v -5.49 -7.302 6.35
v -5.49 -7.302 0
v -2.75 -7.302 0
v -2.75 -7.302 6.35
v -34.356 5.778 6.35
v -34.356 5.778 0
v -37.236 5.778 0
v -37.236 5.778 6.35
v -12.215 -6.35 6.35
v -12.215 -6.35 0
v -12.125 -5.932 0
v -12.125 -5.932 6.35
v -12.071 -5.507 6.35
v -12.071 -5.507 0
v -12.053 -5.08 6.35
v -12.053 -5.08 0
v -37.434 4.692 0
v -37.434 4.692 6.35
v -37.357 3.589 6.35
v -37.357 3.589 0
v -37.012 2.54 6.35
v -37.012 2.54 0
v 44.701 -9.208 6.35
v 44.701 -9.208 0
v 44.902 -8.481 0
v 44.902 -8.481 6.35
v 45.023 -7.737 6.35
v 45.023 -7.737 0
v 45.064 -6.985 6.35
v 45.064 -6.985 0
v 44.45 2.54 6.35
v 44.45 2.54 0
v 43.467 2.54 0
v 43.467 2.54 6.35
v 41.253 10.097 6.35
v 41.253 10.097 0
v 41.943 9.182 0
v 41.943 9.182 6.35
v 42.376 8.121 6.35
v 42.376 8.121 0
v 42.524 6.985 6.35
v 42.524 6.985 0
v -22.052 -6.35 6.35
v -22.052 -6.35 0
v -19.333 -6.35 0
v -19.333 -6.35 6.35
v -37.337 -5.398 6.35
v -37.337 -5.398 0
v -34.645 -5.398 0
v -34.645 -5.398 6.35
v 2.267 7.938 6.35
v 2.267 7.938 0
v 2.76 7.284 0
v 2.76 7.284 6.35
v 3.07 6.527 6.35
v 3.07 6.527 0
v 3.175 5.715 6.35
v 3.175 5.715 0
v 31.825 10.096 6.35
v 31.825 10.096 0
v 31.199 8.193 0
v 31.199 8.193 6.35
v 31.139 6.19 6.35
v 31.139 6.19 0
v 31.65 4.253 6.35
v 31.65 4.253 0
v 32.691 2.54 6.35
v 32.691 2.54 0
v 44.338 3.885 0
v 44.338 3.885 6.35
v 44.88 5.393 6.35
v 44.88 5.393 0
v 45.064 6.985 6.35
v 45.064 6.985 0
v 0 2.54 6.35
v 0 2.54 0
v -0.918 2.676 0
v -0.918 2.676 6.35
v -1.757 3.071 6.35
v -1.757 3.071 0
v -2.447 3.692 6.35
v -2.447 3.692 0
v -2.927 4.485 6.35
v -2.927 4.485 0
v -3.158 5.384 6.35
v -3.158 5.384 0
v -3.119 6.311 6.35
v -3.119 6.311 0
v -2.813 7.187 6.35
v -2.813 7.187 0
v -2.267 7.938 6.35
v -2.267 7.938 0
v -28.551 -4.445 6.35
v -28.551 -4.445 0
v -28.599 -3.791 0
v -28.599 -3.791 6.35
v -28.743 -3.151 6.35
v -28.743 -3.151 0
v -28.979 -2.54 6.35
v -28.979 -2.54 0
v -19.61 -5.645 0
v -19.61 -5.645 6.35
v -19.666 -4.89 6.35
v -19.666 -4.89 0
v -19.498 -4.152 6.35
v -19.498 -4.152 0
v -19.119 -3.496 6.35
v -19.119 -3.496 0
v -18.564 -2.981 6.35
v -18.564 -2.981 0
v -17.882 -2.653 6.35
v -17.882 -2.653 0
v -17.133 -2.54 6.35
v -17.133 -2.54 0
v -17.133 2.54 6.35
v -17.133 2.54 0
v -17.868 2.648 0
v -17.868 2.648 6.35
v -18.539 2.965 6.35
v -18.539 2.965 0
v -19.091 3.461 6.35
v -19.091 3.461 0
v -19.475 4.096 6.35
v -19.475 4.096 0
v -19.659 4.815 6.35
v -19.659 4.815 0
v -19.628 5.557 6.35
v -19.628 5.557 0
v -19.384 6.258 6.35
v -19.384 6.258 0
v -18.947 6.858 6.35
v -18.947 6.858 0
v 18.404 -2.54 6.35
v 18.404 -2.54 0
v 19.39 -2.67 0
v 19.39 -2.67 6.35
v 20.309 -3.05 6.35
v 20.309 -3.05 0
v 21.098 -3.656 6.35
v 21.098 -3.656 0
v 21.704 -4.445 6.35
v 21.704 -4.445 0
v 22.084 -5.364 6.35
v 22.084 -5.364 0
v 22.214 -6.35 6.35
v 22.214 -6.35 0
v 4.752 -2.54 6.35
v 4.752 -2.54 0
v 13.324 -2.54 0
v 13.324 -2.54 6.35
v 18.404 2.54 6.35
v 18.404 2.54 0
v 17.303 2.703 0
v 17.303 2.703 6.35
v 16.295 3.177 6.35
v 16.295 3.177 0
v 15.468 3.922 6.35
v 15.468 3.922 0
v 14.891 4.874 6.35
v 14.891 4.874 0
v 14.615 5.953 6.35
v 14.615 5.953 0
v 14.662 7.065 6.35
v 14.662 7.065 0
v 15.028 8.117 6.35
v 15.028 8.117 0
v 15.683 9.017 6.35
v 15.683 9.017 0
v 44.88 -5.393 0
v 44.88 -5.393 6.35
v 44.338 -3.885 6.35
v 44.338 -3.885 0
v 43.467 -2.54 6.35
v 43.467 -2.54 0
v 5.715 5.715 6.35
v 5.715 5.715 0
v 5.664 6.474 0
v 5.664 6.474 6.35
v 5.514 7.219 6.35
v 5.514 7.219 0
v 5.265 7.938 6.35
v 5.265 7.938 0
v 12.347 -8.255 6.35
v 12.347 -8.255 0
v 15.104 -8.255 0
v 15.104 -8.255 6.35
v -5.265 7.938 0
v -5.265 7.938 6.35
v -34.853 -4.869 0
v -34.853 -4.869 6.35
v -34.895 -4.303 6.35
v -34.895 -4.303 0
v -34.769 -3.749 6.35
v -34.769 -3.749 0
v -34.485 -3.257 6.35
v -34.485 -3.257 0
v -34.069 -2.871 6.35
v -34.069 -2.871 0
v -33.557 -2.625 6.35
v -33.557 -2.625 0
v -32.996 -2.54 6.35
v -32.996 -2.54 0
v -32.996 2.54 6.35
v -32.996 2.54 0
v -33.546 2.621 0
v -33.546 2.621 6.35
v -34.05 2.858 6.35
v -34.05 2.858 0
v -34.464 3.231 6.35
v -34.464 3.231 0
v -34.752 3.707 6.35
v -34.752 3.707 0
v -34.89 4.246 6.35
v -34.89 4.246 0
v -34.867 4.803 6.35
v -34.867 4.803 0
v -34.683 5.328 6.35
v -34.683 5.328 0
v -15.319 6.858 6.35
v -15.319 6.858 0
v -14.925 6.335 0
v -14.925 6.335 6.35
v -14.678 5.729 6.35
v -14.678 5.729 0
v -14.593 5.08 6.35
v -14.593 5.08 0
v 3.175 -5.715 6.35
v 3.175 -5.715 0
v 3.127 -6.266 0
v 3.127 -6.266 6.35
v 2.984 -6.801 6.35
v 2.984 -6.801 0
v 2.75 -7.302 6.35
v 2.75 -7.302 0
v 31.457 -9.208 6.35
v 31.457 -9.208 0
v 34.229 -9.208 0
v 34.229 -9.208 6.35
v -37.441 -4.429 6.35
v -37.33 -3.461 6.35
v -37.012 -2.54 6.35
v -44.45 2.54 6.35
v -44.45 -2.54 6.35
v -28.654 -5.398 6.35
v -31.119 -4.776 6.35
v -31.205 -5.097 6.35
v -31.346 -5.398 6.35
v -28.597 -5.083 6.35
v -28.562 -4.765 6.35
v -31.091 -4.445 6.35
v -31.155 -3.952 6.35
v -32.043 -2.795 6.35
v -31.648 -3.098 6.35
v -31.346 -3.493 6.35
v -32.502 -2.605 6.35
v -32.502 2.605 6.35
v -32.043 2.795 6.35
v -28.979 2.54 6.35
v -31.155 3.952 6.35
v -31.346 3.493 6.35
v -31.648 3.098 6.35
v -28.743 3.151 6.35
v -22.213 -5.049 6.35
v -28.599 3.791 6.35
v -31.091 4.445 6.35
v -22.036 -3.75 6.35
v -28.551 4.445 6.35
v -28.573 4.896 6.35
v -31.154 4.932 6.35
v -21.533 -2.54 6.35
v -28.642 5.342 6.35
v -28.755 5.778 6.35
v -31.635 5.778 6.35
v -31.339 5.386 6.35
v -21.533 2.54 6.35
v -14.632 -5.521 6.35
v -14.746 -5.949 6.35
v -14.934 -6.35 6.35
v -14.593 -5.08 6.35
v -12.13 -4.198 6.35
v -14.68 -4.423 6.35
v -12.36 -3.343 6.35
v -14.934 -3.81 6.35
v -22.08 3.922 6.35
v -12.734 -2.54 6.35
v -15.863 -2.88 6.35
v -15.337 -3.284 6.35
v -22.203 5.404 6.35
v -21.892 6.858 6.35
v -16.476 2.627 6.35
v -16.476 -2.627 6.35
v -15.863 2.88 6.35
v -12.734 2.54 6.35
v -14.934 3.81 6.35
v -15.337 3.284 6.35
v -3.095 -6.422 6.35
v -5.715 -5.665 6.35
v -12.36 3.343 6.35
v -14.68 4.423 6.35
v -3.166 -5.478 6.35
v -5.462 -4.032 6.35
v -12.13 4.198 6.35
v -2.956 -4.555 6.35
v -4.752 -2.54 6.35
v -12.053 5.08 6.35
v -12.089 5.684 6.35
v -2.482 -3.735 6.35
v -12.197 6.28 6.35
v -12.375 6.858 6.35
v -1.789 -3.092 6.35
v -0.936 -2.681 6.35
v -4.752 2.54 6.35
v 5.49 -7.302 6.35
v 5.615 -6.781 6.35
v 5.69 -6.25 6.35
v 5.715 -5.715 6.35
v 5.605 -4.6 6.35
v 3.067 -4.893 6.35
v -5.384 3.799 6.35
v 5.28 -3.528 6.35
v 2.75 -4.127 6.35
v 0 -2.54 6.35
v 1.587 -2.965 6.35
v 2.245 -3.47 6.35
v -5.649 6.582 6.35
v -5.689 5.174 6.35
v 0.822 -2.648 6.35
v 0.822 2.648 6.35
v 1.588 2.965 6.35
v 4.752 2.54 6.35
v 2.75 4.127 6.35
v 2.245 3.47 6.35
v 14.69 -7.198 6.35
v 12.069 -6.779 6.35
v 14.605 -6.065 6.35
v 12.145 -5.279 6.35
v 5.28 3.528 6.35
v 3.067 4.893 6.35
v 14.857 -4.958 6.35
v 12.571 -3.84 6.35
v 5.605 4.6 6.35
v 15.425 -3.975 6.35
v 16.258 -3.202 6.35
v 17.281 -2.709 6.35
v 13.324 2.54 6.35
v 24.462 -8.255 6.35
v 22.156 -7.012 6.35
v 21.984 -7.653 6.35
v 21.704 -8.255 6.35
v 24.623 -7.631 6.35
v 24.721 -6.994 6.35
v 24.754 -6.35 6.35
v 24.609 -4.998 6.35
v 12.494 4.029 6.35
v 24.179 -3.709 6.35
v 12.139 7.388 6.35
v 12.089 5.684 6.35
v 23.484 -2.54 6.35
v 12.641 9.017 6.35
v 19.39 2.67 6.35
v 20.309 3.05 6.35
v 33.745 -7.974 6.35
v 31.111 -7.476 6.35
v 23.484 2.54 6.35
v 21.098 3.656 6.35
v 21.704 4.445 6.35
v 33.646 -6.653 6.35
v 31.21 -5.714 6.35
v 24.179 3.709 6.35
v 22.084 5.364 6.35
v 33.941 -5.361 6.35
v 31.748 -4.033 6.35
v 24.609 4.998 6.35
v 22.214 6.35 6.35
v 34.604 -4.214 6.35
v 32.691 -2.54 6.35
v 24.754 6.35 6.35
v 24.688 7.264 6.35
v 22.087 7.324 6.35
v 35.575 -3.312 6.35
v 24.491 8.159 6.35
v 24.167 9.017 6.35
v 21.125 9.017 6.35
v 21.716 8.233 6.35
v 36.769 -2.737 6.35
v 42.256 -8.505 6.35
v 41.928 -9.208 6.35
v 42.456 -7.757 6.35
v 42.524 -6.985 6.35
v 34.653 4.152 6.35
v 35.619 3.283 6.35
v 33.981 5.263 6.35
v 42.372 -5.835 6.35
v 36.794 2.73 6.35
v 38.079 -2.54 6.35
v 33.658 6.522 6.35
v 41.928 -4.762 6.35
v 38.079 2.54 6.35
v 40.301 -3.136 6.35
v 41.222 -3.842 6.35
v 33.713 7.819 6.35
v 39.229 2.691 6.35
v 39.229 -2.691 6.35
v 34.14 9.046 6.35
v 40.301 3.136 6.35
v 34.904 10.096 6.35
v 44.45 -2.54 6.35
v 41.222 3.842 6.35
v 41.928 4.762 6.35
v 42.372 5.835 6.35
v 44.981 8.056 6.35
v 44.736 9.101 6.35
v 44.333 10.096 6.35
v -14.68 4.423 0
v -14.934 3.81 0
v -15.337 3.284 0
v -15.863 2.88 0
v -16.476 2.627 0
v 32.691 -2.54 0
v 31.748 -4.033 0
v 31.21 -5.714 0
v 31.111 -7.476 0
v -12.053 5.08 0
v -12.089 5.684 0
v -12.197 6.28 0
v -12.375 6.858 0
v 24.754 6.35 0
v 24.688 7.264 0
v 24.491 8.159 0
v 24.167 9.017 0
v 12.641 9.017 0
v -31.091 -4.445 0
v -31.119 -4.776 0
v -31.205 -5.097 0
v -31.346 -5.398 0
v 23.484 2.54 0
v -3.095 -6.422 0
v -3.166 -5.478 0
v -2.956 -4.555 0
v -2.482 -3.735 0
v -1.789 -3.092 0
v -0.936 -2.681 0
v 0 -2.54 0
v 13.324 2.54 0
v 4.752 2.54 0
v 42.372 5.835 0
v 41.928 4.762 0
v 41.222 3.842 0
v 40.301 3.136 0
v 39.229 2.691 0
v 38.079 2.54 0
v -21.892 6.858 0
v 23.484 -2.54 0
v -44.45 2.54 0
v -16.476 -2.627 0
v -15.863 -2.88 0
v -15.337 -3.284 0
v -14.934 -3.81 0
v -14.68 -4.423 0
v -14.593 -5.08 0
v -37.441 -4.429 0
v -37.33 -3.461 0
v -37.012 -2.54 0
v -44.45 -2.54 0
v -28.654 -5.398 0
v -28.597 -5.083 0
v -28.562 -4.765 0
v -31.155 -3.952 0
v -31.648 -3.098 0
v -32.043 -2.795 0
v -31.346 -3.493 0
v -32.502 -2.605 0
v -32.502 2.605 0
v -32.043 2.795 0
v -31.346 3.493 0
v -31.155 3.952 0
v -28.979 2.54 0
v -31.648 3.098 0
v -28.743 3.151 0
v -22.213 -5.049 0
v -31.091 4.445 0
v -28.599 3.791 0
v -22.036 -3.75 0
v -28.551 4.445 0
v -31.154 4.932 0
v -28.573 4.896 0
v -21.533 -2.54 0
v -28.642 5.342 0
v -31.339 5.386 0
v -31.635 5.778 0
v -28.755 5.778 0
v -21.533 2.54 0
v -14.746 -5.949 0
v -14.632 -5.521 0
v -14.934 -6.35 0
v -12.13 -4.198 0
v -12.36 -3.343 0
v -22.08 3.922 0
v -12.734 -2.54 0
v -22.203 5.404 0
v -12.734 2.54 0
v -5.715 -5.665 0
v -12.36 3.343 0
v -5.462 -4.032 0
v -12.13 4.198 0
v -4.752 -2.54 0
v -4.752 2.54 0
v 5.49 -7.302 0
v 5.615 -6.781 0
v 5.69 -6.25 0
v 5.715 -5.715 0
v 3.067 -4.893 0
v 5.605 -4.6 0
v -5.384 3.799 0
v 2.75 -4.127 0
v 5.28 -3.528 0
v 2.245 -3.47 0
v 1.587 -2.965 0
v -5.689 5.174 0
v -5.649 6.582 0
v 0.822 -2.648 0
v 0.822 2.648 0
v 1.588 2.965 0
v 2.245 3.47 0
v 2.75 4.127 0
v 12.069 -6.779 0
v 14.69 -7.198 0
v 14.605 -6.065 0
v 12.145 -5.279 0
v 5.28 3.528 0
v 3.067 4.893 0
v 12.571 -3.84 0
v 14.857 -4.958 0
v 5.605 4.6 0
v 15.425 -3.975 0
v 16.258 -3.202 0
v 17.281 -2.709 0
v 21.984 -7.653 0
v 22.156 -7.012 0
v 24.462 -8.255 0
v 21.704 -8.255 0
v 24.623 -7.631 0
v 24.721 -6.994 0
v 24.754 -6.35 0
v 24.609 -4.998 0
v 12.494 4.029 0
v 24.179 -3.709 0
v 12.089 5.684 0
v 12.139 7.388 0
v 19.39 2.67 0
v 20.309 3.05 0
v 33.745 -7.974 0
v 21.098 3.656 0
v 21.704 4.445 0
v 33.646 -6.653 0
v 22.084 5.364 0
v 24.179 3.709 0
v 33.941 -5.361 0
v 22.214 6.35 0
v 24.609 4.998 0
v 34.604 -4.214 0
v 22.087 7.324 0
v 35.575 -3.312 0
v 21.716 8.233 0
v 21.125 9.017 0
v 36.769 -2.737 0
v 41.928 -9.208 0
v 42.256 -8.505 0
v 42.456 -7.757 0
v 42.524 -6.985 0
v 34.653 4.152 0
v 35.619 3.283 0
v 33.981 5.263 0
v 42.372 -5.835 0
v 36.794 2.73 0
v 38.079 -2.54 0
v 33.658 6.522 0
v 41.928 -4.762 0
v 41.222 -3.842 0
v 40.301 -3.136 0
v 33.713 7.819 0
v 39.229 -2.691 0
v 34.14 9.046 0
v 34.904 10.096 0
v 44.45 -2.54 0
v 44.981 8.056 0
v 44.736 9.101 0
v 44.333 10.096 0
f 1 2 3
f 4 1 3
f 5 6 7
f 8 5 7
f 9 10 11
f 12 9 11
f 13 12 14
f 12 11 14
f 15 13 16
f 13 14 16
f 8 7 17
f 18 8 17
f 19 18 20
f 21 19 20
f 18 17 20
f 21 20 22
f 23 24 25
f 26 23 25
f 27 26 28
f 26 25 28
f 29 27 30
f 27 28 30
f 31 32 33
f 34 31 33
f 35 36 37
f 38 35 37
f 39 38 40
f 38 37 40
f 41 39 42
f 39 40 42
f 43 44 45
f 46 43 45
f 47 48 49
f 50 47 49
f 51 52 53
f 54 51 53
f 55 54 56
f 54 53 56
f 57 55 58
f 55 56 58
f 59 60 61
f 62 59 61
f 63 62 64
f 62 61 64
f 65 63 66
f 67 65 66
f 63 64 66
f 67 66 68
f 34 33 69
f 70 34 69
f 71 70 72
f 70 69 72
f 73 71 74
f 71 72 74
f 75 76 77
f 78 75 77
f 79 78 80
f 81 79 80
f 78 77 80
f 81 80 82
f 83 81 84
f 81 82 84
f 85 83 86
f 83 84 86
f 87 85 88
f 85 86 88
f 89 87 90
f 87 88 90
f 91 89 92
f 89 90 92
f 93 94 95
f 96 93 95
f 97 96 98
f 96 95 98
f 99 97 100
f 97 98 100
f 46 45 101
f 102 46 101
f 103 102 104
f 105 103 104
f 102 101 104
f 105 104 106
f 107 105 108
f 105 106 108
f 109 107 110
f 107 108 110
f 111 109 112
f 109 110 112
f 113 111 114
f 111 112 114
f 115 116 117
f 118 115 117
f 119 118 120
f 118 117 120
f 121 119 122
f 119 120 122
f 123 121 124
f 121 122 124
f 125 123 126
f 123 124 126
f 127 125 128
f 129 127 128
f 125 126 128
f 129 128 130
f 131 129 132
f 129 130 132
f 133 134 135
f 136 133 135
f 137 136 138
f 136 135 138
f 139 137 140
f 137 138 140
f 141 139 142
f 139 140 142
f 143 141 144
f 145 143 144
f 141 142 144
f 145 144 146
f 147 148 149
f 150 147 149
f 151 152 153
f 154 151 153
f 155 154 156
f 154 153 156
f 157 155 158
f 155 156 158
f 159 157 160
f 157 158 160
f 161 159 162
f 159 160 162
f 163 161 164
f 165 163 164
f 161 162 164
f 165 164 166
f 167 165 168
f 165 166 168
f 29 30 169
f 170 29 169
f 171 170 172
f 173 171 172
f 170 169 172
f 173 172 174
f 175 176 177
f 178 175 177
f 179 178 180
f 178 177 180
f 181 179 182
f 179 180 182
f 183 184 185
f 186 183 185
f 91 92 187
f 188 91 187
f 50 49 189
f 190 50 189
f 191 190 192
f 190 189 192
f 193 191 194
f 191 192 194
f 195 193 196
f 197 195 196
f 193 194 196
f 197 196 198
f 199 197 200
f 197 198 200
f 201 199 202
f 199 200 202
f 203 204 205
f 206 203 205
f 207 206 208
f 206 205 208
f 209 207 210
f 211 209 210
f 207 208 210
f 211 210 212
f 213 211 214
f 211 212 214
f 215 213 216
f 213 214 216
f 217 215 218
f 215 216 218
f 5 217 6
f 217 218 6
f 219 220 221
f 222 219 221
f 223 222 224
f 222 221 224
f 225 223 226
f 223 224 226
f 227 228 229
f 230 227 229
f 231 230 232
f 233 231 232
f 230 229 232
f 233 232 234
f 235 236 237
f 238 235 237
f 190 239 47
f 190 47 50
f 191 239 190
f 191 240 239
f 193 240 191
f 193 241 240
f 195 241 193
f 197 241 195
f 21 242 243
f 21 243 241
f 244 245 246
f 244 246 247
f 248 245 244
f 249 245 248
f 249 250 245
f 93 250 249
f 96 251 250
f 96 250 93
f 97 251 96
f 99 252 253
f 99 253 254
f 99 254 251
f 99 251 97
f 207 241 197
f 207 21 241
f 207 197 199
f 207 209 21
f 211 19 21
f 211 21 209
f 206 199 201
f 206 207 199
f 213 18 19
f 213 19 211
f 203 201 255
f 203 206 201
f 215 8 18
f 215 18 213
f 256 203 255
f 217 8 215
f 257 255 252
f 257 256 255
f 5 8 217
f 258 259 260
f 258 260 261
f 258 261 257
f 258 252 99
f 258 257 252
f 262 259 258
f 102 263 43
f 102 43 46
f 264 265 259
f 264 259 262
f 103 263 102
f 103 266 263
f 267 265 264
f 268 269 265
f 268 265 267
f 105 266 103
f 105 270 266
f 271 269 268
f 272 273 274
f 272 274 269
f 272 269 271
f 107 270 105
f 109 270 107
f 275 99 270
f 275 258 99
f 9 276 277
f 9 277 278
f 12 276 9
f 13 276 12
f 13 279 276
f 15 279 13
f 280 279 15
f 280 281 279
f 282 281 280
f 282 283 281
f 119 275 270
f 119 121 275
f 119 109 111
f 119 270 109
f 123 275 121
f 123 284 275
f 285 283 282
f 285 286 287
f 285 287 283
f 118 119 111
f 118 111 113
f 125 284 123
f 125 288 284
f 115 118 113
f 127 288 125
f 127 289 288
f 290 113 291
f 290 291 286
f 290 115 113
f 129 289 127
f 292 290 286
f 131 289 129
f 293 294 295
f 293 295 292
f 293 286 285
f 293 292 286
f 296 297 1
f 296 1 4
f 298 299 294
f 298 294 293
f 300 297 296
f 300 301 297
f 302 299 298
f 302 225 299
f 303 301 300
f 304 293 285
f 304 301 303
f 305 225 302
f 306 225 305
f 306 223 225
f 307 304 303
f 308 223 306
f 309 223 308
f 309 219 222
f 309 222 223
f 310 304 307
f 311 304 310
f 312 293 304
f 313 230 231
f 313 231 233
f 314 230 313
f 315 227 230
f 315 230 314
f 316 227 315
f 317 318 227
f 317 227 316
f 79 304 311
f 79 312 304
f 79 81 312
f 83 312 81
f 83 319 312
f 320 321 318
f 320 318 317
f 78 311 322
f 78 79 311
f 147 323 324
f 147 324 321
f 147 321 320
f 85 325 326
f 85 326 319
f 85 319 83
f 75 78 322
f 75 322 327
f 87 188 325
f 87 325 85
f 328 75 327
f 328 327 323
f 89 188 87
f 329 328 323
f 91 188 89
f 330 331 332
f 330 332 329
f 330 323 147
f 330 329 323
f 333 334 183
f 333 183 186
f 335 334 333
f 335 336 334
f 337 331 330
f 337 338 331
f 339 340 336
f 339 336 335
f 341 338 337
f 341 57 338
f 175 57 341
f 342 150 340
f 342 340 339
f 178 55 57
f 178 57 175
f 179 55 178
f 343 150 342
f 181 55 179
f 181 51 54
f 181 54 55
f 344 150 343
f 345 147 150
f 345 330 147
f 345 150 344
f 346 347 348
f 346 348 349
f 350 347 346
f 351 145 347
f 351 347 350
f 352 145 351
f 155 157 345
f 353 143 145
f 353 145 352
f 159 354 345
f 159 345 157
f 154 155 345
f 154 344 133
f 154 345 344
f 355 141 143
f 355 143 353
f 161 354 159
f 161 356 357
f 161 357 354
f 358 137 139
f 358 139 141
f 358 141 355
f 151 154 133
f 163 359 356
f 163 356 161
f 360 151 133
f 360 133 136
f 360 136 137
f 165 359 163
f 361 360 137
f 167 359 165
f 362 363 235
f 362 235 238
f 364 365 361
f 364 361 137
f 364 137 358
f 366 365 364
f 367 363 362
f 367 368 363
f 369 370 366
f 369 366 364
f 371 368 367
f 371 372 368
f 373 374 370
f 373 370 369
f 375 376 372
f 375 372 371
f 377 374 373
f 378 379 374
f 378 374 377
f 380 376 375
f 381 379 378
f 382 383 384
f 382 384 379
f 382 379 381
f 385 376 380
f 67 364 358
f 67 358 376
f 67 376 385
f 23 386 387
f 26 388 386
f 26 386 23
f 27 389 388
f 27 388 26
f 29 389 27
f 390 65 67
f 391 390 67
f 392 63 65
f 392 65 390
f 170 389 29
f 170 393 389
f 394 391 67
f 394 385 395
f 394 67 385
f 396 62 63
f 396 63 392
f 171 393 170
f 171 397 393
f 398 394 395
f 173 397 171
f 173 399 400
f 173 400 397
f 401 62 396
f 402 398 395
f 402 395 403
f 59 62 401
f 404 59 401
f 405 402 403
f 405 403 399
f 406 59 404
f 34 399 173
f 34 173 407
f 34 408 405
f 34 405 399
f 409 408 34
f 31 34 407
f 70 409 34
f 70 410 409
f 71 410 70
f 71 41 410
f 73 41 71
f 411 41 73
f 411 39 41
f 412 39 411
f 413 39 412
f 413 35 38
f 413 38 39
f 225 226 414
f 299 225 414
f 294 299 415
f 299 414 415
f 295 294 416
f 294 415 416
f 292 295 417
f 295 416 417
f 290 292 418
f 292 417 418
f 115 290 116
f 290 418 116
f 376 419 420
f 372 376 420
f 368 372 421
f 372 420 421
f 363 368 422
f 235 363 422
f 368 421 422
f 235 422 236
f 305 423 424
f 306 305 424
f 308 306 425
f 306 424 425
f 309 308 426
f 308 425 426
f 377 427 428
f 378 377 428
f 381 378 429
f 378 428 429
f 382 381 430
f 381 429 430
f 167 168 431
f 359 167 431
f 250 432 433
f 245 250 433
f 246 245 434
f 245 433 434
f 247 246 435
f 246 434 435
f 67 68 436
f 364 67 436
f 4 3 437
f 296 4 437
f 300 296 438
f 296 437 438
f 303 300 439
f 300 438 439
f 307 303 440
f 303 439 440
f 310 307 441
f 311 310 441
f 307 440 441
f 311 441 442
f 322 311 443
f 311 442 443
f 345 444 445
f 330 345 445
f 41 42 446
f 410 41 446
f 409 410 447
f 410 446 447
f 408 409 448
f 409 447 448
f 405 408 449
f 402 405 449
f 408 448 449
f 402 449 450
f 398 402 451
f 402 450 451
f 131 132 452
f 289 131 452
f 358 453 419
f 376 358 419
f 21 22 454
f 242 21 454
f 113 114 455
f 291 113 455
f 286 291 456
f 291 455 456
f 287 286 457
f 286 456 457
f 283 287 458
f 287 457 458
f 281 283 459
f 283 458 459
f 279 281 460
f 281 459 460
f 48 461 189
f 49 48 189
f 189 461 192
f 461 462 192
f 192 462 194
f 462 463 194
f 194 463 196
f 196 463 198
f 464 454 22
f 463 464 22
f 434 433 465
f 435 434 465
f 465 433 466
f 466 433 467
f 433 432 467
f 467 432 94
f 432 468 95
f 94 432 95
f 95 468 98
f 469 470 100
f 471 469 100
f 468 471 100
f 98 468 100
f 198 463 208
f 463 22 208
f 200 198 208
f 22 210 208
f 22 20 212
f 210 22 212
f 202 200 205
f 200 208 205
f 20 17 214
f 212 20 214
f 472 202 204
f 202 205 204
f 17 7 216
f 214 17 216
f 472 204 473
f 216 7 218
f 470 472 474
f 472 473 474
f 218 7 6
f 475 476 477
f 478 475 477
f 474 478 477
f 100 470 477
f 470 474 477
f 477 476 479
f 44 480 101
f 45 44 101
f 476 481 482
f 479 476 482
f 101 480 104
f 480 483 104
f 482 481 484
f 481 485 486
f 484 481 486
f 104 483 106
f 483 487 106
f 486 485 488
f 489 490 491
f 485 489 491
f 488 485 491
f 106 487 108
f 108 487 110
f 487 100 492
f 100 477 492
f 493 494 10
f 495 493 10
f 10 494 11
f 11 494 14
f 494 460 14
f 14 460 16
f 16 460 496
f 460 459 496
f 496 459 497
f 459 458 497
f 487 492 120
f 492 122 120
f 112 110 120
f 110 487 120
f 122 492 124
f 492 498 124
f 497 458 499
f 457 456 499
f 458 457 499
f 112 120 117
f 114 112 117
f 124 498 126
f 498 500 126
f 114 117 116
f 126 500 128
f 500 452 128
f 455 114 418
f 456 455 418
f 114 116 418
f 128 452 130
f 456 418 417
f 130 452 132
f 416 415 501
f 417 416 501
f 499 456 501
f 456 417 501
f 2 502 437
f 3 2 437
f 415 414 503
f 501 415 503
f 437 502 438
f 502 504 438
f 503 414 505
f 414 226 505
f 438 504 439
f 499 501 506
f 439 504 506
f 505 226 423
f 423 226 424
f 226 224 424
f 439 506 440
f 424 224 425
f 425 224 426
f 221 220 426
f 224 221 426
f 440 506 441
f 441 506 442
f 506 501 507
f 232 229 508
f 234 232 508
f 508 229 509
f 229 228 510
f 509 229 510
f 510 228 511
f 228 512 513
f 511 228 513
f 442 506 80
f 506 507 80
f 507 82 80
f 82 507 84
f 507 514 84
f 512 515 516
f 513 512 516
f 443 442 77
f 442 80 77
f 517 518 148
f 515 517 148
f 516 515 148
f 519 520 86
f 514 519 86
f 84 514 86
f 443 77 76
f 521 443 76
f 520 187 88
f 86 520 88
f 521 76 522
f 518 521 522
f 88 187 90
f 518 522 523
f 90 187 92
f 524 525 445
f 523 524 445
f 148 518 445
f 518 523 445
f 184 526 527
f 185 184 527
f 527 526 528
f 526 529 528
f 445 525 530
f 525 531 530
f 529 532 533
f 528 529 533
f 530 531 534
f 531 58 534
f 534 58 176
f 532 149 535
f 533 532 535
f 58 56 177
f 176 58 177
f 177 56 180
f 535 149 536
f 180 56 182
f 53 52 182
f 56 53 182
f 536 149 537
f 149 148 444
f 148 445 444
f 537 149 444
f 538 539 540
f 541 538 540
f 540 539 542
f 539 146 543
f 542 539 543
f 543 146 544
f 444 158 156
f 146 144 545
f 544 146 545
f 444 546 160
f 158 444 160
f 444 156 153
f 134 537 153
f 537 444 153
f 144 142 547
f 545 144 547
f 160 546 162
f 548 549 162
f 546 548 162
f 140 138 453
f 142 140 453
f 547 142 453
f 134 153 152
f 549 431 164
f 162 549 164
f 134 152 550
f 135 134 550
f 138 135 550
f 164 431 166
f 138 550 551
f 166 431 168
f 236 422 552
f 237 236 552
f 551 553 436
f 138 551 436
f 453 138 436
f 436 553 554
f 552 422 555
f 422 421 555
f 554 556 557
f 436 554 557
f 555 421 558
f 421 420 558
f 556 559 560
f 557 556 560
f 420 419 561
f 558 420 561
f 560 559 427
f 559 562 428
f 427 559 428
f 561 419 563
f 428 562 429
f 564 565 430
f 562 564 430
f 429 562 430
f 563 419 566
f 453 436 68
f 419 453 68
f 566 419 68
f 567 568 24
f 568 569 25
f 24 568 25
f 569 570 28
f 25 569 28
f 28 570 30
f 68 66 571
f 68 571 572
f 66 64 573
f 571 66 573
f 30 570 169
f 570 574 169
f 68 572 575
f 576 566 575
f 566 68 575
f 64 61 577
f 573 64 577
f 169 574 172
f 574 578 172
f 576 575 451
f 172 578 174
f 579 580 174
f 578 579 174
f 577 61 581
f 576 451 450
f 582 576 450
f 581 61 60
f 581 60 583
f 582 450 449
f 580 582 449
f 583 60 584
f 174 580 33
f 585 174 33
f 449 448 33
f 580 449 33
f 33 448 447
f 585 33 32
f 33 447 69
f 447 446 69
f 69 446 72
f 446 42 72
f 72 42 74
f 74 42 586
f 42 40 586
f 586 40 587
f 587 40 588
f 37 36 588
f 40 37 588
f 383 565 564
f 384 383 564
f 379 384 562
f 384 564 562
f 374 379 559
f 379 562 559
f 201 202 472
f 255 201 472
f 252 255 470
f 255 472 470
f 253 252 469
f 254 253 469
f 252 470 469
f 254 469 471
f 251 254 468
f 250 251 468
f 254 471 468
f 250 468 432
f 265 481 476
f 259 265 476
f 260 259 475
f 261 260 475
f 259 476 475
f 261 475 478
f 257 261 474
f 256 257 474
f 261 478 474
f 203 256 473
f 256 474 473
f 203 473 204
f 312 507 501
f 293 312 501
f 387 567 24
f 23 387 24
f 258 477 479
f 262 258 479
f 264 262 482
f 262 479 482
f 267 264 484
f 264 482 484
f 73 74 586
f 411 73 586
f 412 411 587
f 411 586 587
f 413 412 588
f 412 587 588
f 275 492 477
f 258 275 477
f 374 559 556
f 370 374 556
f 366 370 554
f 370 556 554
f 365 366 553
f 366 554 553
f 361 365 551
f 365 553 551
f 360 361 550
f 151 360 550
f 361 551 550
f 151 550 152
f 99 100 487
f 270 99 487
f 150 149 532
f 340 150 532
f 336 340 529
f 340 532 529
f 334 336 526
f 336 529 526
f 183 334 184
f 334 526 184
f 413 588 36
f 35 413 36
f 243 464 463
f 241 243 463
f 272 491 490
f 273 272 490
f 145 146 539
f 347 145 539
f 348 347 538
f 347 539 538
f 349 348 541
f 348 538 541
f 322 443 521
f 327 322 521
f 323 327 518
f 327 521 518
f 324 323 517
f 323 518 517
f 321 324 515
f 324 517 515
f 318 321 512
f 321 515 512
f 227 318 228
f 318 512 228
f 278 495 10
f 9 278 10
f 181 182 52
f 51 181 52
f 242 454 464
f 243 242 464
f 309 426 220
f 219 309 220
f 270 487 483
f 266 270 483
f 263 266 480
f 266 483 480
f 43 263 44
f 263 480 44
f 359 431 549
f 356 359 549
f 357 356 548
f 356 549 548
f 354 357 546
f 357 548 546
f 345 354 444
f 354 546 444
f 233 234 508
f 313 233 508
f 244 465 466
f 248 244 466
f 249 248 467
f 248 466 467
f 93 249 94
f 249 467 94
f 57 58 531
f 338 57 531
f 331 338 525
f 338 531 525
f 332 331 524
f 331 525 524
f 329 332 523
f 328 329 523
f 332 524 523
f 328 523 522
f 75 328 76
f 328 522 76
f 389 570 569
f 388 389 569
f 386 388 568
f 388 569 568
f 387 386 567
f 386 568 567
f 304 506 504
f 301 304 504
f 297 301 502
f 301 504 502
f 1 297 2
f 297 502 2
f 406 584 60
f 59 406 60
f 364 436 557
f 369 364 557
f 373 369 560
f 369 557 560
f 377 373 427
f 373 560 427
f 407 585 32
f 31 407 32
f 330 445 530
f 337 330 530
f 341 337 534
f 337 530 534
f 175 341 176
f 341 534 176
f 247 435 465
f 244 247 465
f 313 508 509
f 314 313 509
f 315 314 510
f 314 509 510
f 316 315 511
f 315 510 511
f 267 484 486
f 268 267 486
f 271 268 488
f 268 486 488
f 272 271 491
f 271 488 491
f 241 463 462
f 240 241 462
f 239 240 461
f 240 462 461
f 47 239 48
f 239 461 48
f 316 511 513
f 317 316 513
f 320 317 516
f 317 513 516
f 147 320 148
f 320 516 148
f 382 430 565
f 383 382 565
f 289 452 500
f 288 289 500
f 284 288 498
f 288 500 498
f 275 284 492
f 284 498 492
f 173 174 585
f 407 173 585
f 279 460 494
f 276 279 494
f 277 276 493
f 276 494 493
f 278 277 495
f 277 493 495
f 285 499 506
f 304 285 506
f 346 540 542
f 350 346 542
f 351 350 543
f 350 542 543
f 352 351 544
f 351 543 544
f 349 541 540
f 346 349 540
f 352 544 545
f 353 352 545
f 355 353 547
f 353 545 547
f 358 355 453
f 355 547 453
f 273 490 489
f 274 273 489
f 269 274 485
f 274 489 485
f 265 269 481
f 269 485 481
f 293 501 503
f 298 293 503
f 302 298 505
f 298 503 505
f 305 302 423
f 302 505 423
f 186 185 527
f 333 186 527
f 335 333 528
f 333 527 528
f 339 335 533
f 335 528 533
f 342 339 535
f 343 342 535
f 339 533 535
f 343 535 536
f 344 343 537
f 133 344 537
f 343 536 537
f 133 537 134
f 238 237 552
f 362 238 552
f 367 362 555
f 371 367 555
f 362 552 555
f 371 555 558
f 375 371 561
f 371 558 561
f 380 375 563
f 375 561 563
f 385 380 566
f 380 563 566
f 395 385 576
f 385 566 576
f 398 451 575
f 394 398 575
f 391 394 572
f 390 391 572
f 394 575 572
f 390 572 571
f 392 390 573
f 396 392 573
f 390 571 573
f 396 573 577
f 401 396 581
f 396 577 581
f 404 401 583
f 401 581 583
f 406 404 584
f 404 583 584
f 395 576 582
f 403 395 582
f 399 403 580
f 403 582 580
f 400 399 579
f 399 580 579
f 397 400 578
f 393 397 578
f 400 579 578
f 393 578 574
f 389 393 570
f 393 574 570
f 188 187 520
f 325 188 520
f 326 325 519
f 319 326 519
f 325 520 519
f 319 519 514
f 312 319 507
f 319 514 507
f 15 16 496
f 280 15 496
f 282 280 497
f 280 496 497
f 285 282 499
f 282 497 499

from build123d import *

# Parameters (mm, degrees)
F1_DEPTH = 6.35


with BuildPart() as f1:
    # F0 (on Top) → F1 (new body)
    with BuildSketch(Plane.XY):
        with BuildLine():
            ThreePointArc((-37.0116242497, -2.54), (-35.3714840618, -0.6882893377), (-32.9955316212, 0))
            ThreePointArc((-32.9955316212, 0), (-35.3714840618, 0.6882893377), (-37.0116242497, 2.54))
            Line((-37.0116242497, 2.54), (-44.45, 2.54))
            Line((-44.45, 2.54), (-44.45, -2.54))
            Line((-44.45, -2.54), (-37.0116242497, -2.54))
        make_face()
        with BuildLine():
            Line((-32.9955316212, 2.54), (-28.9794389928, 2.54))
            ThreePointArc((-28.9794389928, 2.54), (-28.6590839545, 3.4686564983), (-28.5505316212, 4.445))
            ThreePointArc((-28.5505316212, 4.445), (-28.60201483, 5.1195629733), (-28.7552718709, 5.7785))
            Line((-28.7552718709, 5.7785), (-31.6350895056, 5.7785))
            ThreePointArc((-31.6350895056, 5.7785), (-31.231917827, 5.1652023222), (-31.0905316212, 4.445))
            ThreePointArc((-31.0905316212, 4.445), (-31.6484932031, 3.0979615818), (-32.9955316212, 2.54))
        make_face()
        with BuildLine():
            Line((-37.0116242497, 2.54), (-32.9955316212, 2.54))
            ThreePointArc((-32.9955316212, 2.54), (-34.7518548404, 3.7071966725), (-34.3559737369, 5.7785))
            Line((-34.3559737369, 5.7785), (-37.2357913715, 5.7785))
            ThreePointArc((-37.2357913715, 5.7785), (-37.4299210057, 4.1380540974), (-37.0116242497, 2.54))
        make_face()
        with BuildLine():
            ThreePointArc((-32.9955316212, 0), (-30.6195791806, 0.6882893377), (-28.9794389928, 2.54))
            Line((-28.9794389928, 2.54), (-32.9955316212, 2.54))
            Line((-32.9955316212, 2.54), (-37.0116242497, 2.54))
            ThreePointArc((-37.0116242497, 2.54), (-35.3714840618, 0.6882893377), (-32.9955316212, 0))
        make_face()
        with BuildLine():
            Line((-32.9955316212, -2.54), (-28.9794389928, -2.54))
            ThreePointArc((-28.9794389928, -2.54), (-30.6195791806, -0.6882893377), (-32.9955316212, 0))
            ThreePointArc((-32.9955316212, 0), (-35.3714840618, -0.6882893377), (-37.0116242497, -2.54))
            Line((-37.0116242497, -2.54), (-32.9955316212, -2.54))
        make_face()
        with BuildLine():
            ThreePointArc((-34.6453100154, -5.3975), (-34.6453100154, -3.4925), (-32.9955316212, -2.54))
            Line((-32.9955316212, -2.54), (-37.0116242497, -2.54))
            ThreePointArc((-37.0116242497, -2.54), (-37.4119439902, -3.941684207), (-37.3372788214, -5.3975))
            Line((-37.3372788214, -5.3975), (-34.6453100154, -5.3975))
        make_face()
        with BuildLine():
            ThreePointArc((-28.5505316212, -4.445), (-28.6590839545, -3.4686564983), (-28.9794389928, -2.54))
            Line((-28.9794389928, -2.54), (-32.9955316212, -2.54))
            ThreePointArc((-32.9955316212, -2.54), (-31.6484932031, -3.0979615818), (-31.0905316212, -4.445))
            ThreePointArc((-31.0905316212, -4.445), (-31.1554429222, -4.9380502809), (-31.345753227, -5.3975))
            Line((-31.345753227, -5.3975), (-28.6537844211, -5.3975))
            ThreePointArc((-28.6537844211, -5.3975), (-28.5764202114, -4.9240400272), (-28.5505316212, -4.445))
        make_face()
        with BuildLine():
            ThreePointArc((-21.5326457565, -2.54), (-19.6732367053, -0.6805909488), (-17.1332367053, 0))
            ThreePointArc((-17.1332367053, 0), (-19.6732367053, 0.6805909488), (-21.5326457565, 2.54))
            Line((-21.5326457565, 2.54), (-28.9794389928, 2.54))
            ThreePointArc((-28.9794389928, 2.54), (-30.6195791806, 0.6882893377), (-32.9955316212, 0))
            ThreePointArc((-32.9955316212, 0), (-30.6195791806, -0.6882893377), (-28.9794389928, -2.54))
            Line((-28.9794389928, -2.54), (-21.5326457565, -2.54))
        make_face()
        with BuildLine():
            ThreePointArc((-19.3329412309, -6.35), (-19.3329412309, -3.81), (-17.1332367053, -2.54))
            Line((-17.1332367053, -2.54), (-21.5326457565, -2.54))
            ThreePointArc((-21.5326457565, -2.54), (-22.1667009321, -4.3939694779), (-22.051925555, -6.35))
            Line((-22.051925555, -6.35), (-19.3329412309, -6.35))
        make_face()
        with BuildLine():
            ThreePointArc((-12.0532367053, -5.08), (-12.2263335078, -3.7651992509), (-12.7338276541, -2.54))
            Line((-12.7338276541, -2.54), (-17.1332367053, -2.54))
            ThreePointArc((-17.1332367053, -2.54), (-15.3371854811, -3.2839487758), (-14.5932367053, -5.08))
            ThreePointArc((-14.5932367053, -5.08), (-14.6797851065, -5.7374003746), (-14.9335321797, -6.35))
            Line((-14.9335321797, -6.35), (-12.2145478556, -6.35))
            ThreePointArc((-12.2145478556, -6.35), (-12.0937258483, -5.7201018058), (-12.0532367053, -5.08))
        make_face()
        with BuildLine():
            Line((-17.1332367053, -2.54), (-12.7338276541, -2.54))
            ThreePointArc((-12.7338276541, -2.54), (-14.5932367053, -0.6805909488), (-17.1332367053, 0))
            ThreePointArc((-17.1332367053, 0), (-19.6732367053, -0.6805909488), (-21.5326457565, -2.54))
            Line((-21.5326457565, -2.54), (-17.1332367053, -2.54))
        make_face()
        with BuildLine():
            Line((-21.5326457565, 2.54), (-17.1332367053, 2.54))
            ThreePointArc((-17.1332367053, 2.54), (-19.4750009975, 4.0962622301), (-18.9471595262, 6.858))
            Line((-18.9471595262, 6.858), (-21.8919251801, 6.858))
            ThreePointArc((-21.8919251801, 6.858), (-22.1957428608, 4.6587739015), (-21.5326457565, 2.54))
        make_face()
        with BuildLine():
            ThreePointArc((-17.1332367053, 0), (-14.5932367053, 0.6805909488), (-12.7338276541, 2.54))
            Line((-12.7338276541, 2.54), (-17.1332367053, 2.54))
            Line((-17.1332367053, 2.54), (-21.5326457565, 2.54))
            ThreePointArc((-21.5326457565, 2.54), (-19.6732367053, 0.6805909488), (-17.1332367053, 0))
        make_face()
        with BuildLine():
            Line((-17.1332367053, 2.54), (-12.7338276541, 2.54))
            ThreePointArc((-12.7338276541, 2.54), (-12.2263335078, 3.7651992509), (-12.0532367053, 5.08))
            ThreePointArc((-12.0532367053, 5.08), (-12.1342099274, 5.9833998417), (-12.3745482305, 6.858))
            Line((-12.3745482305, 6.858), (-15.3193138845, 6.858))
            ThreePointArc((-15.3193138845, 6.858), (-14.7817516464, 6.0402697629), (-14.5932367053, 5.08))
            ThreePointArc((-14.5932367053, 5.08), (-15.3371854811, 3.2839487758), (-17.1332367053, 2.54))
        make_face()
        with BuildLine():
            ThreePointArc((-4.7519048812, -2.54), (-2.6940768363, -0.6748437524), (0, 0))
            ThreePointArc((0, 0), (-2.6940768363, 0.6748437524), (-4.7519048812, 2.54))
            Line((-4.7519048812, 2.54), (-12.7338276541, 2.54))
            ThreePointArc((-12.7338276541, 2.54), (-14.5932367053, 0.6805909488), (-17.1332367053, 0))
            ThreePointArc((-17.1332367053, 0), (-14.5932367053, -0.6805909488), (-12.7338276541, -2.54))
            Line((-12.7338276541, -2.54), (-4.7519048812, -2.54))
        make_face()
        with BuildLine():
            Line((-4.7519048812, 2.54), (0, 2.54))
            ThreePointArc((0, 2.54), (-2.9272053652, 4.4853277876), (-2.2674035261, 7.9375))
            Line((-2.2674035261, 7.9375), (-5.2651418547, 7.9375))
            ThreePointArc((-5.2651418547, 7.9375), (-5.6893372101, 5.1740128373), (-4.7519048812, 2.54))
        make_face()
        with BuildLine():
            ThreePointArc((0, 0), (2.6940768363, 0.6748437524), (4.7519048812, 2.54))
            Line((4.7519048812, 2.54), (0, 2.54))
            Line((0, 2.54), (-4.7519048812, 2.54))
            ThreePointArc((-4.7519048812, 2.54), (-2.6940768363, 0.6748437524), (0, 0))
        make_face()
        with BuildLine():
            Line((0, 2.54), (4.7519048812, 2.54))
            ThreePointArc((4.7519048812, 2.54), (5.4689286609, 4.0560713391), (5.715, 5.715))
            ThreePointArc((5.715, 5.715), (5.601406551, 6.8487855398), (5.2651418547, 7.9375))
            Line((5.2651418547, 7.9375), (2.2674035261, 7.9375))
            ThreePointArc((2.2674035261, 7.9375), (2.9393563237, 6.9153372036), (3.175, 5.715))
            ThreePointArc((3.175, 5.715), (2.2450640303, 3.4699359697), (0, 2.54))
        make_face()
        with BuildLine():
            ThreePointArc((-2.749630657, -7.3025), (-2.7496306576, -4.127500001), (-2.2e-09, -2.54))
            Line((-2.2e-09, -2.54), (-4.7519048812, -2.54))
            ThreePointArc((-4.7519048812, -2.54), (-5.6475620647, -4.8396328051), (-5.4900882279, -7.3025))
            Line((-5.4900882279, -7.3025), (-2.749630657, -7.3025))
        make_face()
        with BuildLine():
            Line((-2.2e-09, -2.54), (4.7519048812, -2.54))
            ThreePointArc((4.7519048812, -2.54), (2.6940768363, -0.6748437524), (0, 0))
            ThreePointArc((0, 0), (-2.6940768363, -0.6748437524), (-4.7519048812, -2.54))
            Line((-4.7519048812, -2.54), (-2.2e-09, -2.54))
        make_face()
        with BuildLine():
            ThreePointArc((5.715, -5.715), (5.4689286609, -4.0560713391), (4.7519048812, -2.54))
            Line((4.7519048812, -2.54), (-2.2e-09, -2.54))
            ThreePointArc((-2.2e-09, -2.54), (2.2450640295, -3.469935969), (3.175, -5.715))
            ThreePointArc((3.175, -5.715), (3.0668144985, -6.5367504682), (2.749630657, -7.3025))
            Line((2.749630657, -7.3025), (5.4900882279, -7.3025))
            ThreePointArc((5.4900882279, -7.3025), (5.6584926978, -6.5166766111), (5.715, -5.715))
        make_face()
        with BuildLine():
            Line((13.3240484677, 2.54), (18.4040484677, 2.54))
            ThreePointArc((18.4040484677, 2.54), (14.8914020294, 4.8743933451), (15.6831642364, 9.017))
            Line((15.6831642364, 9.017), (12.641270405, 9.017))
            ThreePointArc((12.641270405, 9.017), (12.0890392611, 5.6842983245), (13.3240484677, 2.54))
        make_face()
        with BuildLine():
            ThreePointArc((18.4040484677, 0), (21.2438547991, 0.6703873372), (23.4840484677, 2.54))
            Line((23.4840484677, 2.54), (18.4040484677, 2.54))
            Line((18.4040484677, 2.54), (13.3240484677, 2.54))
            ThreePointArc((13.3240484677, 2.54), (15.5642421362, 0.6703873372), (18.4040484677, 0))
        make_face()
        with BuildLine():
            Line((18.4040484677, 2.54), (23.4840484677, 2.54))
            ThreePointArc((23.4840484677, 2.54), (24.4281874103, 4.3419536858), (24.7540484677, 6.35))
            ThreePointArc((24.7540484677, 6.35), (24.6055055827, 7.7154411928), (24.1668265304, 9.017))
            Line((24.1668265304, 9.017), (21.1249326989, 9.017))
            ThreePointArc((21.1249326989, 9.017), (21.9312760561, 7.7904046443), (22.2140484677, 6.35))
            ThreePointArc((22.2140484677, 6.35), (21.098125304, 3.6559231637), (18.4040484677, 2.54))
        make_face()
        with BuildLine():
            ThreePointArc((15.1044916792, -8.255), (15.1044916792, -4.445), (18.4040484677, -2.54))
            Line((18.4040484677, -2.54), (13.3240484677, -2.54))
            ThreePointArc((13.3240484677, -2.54), (12.1449462653, -5.2794208949), (12.3465345387, -8.255))
            Line((12.3465345387, -8.255), (15.1044916792, -8.255))
        make_face()
        with BuildLine():
            Line((18.4040484677, -2.54), (23.4840484677, -2.54))
            ThreePointArc((23.4840484677, -2.54), (21.2438547991, -0.6703873372), (18.4040484677, 0))
            ThreePointArc((18.4040484677, 0), (15.5642421362, -0.6703873372), (13.3240484677, -2.54))
            Line((13.3240484677, -2.54), (18.4040484677, -2.54))
        make_face()
        with BuildLine():
            ThreePointArc((24.7540484677, -6.35), (24.4281874103, -4.3419536858), (23.4840484677, -2.54))
            Line((23.4840484677, -2.54), (18.4040484677, -2.54))
            ThreePointArc((18.4040484677, -2.54), (21.098125304, -3.6559231637), (22.2140484677, -6.35))
            ThreePointArc((22.2140484677, -6.35), (22.0842258658, -7.3361005618), (21.7036052561, -8.255))
            Line((21.7036052561, -8.255), (24.4615623967, -8.255))
            ThreePointArc((24.4615623967, -8.255), (24.6805010266, -7.3136613904), (24.7540484677, -6.35))
        make_face()
        with BuildLine():
            ThreePointArc((32.6906501938, -2.54), (35.1003898589, -0.6668297744), (38.0788038664, 0))
            ThreePointArc((38.0788038664, 0), (35.1003898589, 0.6668297744), (32.6906501938, 2.54))
            Line((32.6906501938, 2.54), (23.4840484677, 2.54))
            ThreePointArc((23.4840484677, 2.54), (21.2438547991, 0.6703873372), (18.4040484677, 0))
            ThreePointArc((18.4040484677, 0), (21.2438547991, -0.6703873372), (23.4840484677, -2.54))
            Line((23.4840484677, -2.54), (32.6906501938, -2.54))
        make_face()
        with BuildLine():
            Line((32.6906501938, 2.54), (38.0788038664, 2.54))
            ThreePointArc((38.0788038664, 2.54), (33.9807163551, 5.2634589026), (34.9044389299, 10.0965))
            Line((34.9044389299, 10.0965), (31.825101543, 10.0965))
            ThreePointArc((31.825101543, 10.0965), (31.1391802584, 6.1901105868), (32.6906501938, 2.54))
        make_face()
        with BuildLine():
            ThreePointArc((38.0788038664, 0), (41.0572178739, 0.6668297744), (43.466957539, 2.54))
            Line((43.466957539, 2.54), (38.0788038664, 2.54))
            Line((38.0788038664, 2.54), (32.6906501938, 2.54))
            ThreePointArc((32.6906501938, 2.54), (35.1003898589, 0.6668297744), (38.0788038664, 0))
        make_face()
        with BuildLine():
            Line((38.0788038664, 2.54), (43.466957539, 2.54))
            ThreePointArc((43.466957539, 2.54), (44.6524816195, 4.6234357306), (45.0638038664, 6.985))
            ThreePointArc((45.0638038664, 6.985), (44.8785220859, 8.5831417758), (44.3325061898, 10.0965))
            Line((44.3325061898, 10.0965), (41.2531688029, 10.0965))
            ThreePointArc((41.2531688029, 10.0965), (42.1939027196, 8.6654720851), (42.5238038664, 6.985))
            ThreePointArc((42.5238038664, 6.985), (41.2218935088, 3.8419103576), (38.0788038664, 2.54))
        make_face()
        with BuildLine():
            ThreePointArc((43.466957539, -2.54), (41.0572178739, -0.6668297744), (38.0788038664, 0))
            ThreePointArc((38.0788038664, 0), (35.1003898589, -0.6668297744), (32.6906501938, -2.54))
            Line((32.6906501938, -2.54), (38.0788038664, -2.54))
            Line((38.0788038664, -2.54), (43.466957539, -2.54))
        make_face()
        with BuildLine():
            Line((38.0788038664, -2.54), (32.6906501938, -2.54))
            ThreePointArc((32.6906501938, -2.54), (31.2104152675, -5.7139913238), (31.4568163438, -9.2075))
            Line((31.4568163438, -9.2075), (34.2293209466, -9.2075))
            ThreePointArc((34.2293209466, -9.2075), (34.2293209466, -4.7625), (38.0788038664, -2.54))
        make_face()
        with BuildLine():
            ThreePointArc((45.0638038664, -6.985), (44.6524816195, -4.6234357306), (43.466957539, -2.54))
            Line((43.466957539, -2.54), (38.0788038664, -2.54))
            ThreePointArc((38.0788038664, -2.54), (41.2218935088, -3.8419103576), (42.5238038664, -6.985))
            ThreePointArc((42.5238038664, -6.985), (42.3723441642, -8.1354506555), (41.9282867862, -9.2075))
            Line((41.9282867862, -9.2075), (44.700791389, -9.2075))
            ThreePointArc((44.700791389, -9.2075), (44.9724534022, -8.1109756113), (45.0638038664, -6.985))
        make_face()
        with BuildLine():
            Line((44.45, -2.54), (44.45, 2.54))
            Line((44.45, 2.54), (43.466957539, 2.54))
            ThreePointArc((43.466957539, 2.54), (41.0572178739, 0.6668297744), (38.0788038664, 0))
            ThreePointArc((38.0788038664, 0), (41.0572178739, -0.6668297744), (43.466957539, -2.54))
            Line((43.466957539, -2.54), (44.45, -2.54))
        make_face()
        with BuildLine():
            ThreePointArc((13.3240484677, -2.54), (15.5642421362, -0.6703873372), (18.4040484677, 0))
            ThreePointArc((18.4040484677, 0), (15.5642421362, 0.6703873372), (13.3240484677, 2.54))
            Line((13.3240484677, 2.54), (4.7519048812, 2.54))
            ThreePointArc((4.7519048812, 2.54), (2.6940768363, 0.6748437524), (0, 0))
            ThreePointArc((0, 0), (2.6940768363, -0.6748437524), (4.7519048812, -2.54))
            Line((4.7519048812, -2.54), (13.3240484677, -2.54))
        make_face()
    extrude(amount=F1_DEPTH)


solid = f1.part
